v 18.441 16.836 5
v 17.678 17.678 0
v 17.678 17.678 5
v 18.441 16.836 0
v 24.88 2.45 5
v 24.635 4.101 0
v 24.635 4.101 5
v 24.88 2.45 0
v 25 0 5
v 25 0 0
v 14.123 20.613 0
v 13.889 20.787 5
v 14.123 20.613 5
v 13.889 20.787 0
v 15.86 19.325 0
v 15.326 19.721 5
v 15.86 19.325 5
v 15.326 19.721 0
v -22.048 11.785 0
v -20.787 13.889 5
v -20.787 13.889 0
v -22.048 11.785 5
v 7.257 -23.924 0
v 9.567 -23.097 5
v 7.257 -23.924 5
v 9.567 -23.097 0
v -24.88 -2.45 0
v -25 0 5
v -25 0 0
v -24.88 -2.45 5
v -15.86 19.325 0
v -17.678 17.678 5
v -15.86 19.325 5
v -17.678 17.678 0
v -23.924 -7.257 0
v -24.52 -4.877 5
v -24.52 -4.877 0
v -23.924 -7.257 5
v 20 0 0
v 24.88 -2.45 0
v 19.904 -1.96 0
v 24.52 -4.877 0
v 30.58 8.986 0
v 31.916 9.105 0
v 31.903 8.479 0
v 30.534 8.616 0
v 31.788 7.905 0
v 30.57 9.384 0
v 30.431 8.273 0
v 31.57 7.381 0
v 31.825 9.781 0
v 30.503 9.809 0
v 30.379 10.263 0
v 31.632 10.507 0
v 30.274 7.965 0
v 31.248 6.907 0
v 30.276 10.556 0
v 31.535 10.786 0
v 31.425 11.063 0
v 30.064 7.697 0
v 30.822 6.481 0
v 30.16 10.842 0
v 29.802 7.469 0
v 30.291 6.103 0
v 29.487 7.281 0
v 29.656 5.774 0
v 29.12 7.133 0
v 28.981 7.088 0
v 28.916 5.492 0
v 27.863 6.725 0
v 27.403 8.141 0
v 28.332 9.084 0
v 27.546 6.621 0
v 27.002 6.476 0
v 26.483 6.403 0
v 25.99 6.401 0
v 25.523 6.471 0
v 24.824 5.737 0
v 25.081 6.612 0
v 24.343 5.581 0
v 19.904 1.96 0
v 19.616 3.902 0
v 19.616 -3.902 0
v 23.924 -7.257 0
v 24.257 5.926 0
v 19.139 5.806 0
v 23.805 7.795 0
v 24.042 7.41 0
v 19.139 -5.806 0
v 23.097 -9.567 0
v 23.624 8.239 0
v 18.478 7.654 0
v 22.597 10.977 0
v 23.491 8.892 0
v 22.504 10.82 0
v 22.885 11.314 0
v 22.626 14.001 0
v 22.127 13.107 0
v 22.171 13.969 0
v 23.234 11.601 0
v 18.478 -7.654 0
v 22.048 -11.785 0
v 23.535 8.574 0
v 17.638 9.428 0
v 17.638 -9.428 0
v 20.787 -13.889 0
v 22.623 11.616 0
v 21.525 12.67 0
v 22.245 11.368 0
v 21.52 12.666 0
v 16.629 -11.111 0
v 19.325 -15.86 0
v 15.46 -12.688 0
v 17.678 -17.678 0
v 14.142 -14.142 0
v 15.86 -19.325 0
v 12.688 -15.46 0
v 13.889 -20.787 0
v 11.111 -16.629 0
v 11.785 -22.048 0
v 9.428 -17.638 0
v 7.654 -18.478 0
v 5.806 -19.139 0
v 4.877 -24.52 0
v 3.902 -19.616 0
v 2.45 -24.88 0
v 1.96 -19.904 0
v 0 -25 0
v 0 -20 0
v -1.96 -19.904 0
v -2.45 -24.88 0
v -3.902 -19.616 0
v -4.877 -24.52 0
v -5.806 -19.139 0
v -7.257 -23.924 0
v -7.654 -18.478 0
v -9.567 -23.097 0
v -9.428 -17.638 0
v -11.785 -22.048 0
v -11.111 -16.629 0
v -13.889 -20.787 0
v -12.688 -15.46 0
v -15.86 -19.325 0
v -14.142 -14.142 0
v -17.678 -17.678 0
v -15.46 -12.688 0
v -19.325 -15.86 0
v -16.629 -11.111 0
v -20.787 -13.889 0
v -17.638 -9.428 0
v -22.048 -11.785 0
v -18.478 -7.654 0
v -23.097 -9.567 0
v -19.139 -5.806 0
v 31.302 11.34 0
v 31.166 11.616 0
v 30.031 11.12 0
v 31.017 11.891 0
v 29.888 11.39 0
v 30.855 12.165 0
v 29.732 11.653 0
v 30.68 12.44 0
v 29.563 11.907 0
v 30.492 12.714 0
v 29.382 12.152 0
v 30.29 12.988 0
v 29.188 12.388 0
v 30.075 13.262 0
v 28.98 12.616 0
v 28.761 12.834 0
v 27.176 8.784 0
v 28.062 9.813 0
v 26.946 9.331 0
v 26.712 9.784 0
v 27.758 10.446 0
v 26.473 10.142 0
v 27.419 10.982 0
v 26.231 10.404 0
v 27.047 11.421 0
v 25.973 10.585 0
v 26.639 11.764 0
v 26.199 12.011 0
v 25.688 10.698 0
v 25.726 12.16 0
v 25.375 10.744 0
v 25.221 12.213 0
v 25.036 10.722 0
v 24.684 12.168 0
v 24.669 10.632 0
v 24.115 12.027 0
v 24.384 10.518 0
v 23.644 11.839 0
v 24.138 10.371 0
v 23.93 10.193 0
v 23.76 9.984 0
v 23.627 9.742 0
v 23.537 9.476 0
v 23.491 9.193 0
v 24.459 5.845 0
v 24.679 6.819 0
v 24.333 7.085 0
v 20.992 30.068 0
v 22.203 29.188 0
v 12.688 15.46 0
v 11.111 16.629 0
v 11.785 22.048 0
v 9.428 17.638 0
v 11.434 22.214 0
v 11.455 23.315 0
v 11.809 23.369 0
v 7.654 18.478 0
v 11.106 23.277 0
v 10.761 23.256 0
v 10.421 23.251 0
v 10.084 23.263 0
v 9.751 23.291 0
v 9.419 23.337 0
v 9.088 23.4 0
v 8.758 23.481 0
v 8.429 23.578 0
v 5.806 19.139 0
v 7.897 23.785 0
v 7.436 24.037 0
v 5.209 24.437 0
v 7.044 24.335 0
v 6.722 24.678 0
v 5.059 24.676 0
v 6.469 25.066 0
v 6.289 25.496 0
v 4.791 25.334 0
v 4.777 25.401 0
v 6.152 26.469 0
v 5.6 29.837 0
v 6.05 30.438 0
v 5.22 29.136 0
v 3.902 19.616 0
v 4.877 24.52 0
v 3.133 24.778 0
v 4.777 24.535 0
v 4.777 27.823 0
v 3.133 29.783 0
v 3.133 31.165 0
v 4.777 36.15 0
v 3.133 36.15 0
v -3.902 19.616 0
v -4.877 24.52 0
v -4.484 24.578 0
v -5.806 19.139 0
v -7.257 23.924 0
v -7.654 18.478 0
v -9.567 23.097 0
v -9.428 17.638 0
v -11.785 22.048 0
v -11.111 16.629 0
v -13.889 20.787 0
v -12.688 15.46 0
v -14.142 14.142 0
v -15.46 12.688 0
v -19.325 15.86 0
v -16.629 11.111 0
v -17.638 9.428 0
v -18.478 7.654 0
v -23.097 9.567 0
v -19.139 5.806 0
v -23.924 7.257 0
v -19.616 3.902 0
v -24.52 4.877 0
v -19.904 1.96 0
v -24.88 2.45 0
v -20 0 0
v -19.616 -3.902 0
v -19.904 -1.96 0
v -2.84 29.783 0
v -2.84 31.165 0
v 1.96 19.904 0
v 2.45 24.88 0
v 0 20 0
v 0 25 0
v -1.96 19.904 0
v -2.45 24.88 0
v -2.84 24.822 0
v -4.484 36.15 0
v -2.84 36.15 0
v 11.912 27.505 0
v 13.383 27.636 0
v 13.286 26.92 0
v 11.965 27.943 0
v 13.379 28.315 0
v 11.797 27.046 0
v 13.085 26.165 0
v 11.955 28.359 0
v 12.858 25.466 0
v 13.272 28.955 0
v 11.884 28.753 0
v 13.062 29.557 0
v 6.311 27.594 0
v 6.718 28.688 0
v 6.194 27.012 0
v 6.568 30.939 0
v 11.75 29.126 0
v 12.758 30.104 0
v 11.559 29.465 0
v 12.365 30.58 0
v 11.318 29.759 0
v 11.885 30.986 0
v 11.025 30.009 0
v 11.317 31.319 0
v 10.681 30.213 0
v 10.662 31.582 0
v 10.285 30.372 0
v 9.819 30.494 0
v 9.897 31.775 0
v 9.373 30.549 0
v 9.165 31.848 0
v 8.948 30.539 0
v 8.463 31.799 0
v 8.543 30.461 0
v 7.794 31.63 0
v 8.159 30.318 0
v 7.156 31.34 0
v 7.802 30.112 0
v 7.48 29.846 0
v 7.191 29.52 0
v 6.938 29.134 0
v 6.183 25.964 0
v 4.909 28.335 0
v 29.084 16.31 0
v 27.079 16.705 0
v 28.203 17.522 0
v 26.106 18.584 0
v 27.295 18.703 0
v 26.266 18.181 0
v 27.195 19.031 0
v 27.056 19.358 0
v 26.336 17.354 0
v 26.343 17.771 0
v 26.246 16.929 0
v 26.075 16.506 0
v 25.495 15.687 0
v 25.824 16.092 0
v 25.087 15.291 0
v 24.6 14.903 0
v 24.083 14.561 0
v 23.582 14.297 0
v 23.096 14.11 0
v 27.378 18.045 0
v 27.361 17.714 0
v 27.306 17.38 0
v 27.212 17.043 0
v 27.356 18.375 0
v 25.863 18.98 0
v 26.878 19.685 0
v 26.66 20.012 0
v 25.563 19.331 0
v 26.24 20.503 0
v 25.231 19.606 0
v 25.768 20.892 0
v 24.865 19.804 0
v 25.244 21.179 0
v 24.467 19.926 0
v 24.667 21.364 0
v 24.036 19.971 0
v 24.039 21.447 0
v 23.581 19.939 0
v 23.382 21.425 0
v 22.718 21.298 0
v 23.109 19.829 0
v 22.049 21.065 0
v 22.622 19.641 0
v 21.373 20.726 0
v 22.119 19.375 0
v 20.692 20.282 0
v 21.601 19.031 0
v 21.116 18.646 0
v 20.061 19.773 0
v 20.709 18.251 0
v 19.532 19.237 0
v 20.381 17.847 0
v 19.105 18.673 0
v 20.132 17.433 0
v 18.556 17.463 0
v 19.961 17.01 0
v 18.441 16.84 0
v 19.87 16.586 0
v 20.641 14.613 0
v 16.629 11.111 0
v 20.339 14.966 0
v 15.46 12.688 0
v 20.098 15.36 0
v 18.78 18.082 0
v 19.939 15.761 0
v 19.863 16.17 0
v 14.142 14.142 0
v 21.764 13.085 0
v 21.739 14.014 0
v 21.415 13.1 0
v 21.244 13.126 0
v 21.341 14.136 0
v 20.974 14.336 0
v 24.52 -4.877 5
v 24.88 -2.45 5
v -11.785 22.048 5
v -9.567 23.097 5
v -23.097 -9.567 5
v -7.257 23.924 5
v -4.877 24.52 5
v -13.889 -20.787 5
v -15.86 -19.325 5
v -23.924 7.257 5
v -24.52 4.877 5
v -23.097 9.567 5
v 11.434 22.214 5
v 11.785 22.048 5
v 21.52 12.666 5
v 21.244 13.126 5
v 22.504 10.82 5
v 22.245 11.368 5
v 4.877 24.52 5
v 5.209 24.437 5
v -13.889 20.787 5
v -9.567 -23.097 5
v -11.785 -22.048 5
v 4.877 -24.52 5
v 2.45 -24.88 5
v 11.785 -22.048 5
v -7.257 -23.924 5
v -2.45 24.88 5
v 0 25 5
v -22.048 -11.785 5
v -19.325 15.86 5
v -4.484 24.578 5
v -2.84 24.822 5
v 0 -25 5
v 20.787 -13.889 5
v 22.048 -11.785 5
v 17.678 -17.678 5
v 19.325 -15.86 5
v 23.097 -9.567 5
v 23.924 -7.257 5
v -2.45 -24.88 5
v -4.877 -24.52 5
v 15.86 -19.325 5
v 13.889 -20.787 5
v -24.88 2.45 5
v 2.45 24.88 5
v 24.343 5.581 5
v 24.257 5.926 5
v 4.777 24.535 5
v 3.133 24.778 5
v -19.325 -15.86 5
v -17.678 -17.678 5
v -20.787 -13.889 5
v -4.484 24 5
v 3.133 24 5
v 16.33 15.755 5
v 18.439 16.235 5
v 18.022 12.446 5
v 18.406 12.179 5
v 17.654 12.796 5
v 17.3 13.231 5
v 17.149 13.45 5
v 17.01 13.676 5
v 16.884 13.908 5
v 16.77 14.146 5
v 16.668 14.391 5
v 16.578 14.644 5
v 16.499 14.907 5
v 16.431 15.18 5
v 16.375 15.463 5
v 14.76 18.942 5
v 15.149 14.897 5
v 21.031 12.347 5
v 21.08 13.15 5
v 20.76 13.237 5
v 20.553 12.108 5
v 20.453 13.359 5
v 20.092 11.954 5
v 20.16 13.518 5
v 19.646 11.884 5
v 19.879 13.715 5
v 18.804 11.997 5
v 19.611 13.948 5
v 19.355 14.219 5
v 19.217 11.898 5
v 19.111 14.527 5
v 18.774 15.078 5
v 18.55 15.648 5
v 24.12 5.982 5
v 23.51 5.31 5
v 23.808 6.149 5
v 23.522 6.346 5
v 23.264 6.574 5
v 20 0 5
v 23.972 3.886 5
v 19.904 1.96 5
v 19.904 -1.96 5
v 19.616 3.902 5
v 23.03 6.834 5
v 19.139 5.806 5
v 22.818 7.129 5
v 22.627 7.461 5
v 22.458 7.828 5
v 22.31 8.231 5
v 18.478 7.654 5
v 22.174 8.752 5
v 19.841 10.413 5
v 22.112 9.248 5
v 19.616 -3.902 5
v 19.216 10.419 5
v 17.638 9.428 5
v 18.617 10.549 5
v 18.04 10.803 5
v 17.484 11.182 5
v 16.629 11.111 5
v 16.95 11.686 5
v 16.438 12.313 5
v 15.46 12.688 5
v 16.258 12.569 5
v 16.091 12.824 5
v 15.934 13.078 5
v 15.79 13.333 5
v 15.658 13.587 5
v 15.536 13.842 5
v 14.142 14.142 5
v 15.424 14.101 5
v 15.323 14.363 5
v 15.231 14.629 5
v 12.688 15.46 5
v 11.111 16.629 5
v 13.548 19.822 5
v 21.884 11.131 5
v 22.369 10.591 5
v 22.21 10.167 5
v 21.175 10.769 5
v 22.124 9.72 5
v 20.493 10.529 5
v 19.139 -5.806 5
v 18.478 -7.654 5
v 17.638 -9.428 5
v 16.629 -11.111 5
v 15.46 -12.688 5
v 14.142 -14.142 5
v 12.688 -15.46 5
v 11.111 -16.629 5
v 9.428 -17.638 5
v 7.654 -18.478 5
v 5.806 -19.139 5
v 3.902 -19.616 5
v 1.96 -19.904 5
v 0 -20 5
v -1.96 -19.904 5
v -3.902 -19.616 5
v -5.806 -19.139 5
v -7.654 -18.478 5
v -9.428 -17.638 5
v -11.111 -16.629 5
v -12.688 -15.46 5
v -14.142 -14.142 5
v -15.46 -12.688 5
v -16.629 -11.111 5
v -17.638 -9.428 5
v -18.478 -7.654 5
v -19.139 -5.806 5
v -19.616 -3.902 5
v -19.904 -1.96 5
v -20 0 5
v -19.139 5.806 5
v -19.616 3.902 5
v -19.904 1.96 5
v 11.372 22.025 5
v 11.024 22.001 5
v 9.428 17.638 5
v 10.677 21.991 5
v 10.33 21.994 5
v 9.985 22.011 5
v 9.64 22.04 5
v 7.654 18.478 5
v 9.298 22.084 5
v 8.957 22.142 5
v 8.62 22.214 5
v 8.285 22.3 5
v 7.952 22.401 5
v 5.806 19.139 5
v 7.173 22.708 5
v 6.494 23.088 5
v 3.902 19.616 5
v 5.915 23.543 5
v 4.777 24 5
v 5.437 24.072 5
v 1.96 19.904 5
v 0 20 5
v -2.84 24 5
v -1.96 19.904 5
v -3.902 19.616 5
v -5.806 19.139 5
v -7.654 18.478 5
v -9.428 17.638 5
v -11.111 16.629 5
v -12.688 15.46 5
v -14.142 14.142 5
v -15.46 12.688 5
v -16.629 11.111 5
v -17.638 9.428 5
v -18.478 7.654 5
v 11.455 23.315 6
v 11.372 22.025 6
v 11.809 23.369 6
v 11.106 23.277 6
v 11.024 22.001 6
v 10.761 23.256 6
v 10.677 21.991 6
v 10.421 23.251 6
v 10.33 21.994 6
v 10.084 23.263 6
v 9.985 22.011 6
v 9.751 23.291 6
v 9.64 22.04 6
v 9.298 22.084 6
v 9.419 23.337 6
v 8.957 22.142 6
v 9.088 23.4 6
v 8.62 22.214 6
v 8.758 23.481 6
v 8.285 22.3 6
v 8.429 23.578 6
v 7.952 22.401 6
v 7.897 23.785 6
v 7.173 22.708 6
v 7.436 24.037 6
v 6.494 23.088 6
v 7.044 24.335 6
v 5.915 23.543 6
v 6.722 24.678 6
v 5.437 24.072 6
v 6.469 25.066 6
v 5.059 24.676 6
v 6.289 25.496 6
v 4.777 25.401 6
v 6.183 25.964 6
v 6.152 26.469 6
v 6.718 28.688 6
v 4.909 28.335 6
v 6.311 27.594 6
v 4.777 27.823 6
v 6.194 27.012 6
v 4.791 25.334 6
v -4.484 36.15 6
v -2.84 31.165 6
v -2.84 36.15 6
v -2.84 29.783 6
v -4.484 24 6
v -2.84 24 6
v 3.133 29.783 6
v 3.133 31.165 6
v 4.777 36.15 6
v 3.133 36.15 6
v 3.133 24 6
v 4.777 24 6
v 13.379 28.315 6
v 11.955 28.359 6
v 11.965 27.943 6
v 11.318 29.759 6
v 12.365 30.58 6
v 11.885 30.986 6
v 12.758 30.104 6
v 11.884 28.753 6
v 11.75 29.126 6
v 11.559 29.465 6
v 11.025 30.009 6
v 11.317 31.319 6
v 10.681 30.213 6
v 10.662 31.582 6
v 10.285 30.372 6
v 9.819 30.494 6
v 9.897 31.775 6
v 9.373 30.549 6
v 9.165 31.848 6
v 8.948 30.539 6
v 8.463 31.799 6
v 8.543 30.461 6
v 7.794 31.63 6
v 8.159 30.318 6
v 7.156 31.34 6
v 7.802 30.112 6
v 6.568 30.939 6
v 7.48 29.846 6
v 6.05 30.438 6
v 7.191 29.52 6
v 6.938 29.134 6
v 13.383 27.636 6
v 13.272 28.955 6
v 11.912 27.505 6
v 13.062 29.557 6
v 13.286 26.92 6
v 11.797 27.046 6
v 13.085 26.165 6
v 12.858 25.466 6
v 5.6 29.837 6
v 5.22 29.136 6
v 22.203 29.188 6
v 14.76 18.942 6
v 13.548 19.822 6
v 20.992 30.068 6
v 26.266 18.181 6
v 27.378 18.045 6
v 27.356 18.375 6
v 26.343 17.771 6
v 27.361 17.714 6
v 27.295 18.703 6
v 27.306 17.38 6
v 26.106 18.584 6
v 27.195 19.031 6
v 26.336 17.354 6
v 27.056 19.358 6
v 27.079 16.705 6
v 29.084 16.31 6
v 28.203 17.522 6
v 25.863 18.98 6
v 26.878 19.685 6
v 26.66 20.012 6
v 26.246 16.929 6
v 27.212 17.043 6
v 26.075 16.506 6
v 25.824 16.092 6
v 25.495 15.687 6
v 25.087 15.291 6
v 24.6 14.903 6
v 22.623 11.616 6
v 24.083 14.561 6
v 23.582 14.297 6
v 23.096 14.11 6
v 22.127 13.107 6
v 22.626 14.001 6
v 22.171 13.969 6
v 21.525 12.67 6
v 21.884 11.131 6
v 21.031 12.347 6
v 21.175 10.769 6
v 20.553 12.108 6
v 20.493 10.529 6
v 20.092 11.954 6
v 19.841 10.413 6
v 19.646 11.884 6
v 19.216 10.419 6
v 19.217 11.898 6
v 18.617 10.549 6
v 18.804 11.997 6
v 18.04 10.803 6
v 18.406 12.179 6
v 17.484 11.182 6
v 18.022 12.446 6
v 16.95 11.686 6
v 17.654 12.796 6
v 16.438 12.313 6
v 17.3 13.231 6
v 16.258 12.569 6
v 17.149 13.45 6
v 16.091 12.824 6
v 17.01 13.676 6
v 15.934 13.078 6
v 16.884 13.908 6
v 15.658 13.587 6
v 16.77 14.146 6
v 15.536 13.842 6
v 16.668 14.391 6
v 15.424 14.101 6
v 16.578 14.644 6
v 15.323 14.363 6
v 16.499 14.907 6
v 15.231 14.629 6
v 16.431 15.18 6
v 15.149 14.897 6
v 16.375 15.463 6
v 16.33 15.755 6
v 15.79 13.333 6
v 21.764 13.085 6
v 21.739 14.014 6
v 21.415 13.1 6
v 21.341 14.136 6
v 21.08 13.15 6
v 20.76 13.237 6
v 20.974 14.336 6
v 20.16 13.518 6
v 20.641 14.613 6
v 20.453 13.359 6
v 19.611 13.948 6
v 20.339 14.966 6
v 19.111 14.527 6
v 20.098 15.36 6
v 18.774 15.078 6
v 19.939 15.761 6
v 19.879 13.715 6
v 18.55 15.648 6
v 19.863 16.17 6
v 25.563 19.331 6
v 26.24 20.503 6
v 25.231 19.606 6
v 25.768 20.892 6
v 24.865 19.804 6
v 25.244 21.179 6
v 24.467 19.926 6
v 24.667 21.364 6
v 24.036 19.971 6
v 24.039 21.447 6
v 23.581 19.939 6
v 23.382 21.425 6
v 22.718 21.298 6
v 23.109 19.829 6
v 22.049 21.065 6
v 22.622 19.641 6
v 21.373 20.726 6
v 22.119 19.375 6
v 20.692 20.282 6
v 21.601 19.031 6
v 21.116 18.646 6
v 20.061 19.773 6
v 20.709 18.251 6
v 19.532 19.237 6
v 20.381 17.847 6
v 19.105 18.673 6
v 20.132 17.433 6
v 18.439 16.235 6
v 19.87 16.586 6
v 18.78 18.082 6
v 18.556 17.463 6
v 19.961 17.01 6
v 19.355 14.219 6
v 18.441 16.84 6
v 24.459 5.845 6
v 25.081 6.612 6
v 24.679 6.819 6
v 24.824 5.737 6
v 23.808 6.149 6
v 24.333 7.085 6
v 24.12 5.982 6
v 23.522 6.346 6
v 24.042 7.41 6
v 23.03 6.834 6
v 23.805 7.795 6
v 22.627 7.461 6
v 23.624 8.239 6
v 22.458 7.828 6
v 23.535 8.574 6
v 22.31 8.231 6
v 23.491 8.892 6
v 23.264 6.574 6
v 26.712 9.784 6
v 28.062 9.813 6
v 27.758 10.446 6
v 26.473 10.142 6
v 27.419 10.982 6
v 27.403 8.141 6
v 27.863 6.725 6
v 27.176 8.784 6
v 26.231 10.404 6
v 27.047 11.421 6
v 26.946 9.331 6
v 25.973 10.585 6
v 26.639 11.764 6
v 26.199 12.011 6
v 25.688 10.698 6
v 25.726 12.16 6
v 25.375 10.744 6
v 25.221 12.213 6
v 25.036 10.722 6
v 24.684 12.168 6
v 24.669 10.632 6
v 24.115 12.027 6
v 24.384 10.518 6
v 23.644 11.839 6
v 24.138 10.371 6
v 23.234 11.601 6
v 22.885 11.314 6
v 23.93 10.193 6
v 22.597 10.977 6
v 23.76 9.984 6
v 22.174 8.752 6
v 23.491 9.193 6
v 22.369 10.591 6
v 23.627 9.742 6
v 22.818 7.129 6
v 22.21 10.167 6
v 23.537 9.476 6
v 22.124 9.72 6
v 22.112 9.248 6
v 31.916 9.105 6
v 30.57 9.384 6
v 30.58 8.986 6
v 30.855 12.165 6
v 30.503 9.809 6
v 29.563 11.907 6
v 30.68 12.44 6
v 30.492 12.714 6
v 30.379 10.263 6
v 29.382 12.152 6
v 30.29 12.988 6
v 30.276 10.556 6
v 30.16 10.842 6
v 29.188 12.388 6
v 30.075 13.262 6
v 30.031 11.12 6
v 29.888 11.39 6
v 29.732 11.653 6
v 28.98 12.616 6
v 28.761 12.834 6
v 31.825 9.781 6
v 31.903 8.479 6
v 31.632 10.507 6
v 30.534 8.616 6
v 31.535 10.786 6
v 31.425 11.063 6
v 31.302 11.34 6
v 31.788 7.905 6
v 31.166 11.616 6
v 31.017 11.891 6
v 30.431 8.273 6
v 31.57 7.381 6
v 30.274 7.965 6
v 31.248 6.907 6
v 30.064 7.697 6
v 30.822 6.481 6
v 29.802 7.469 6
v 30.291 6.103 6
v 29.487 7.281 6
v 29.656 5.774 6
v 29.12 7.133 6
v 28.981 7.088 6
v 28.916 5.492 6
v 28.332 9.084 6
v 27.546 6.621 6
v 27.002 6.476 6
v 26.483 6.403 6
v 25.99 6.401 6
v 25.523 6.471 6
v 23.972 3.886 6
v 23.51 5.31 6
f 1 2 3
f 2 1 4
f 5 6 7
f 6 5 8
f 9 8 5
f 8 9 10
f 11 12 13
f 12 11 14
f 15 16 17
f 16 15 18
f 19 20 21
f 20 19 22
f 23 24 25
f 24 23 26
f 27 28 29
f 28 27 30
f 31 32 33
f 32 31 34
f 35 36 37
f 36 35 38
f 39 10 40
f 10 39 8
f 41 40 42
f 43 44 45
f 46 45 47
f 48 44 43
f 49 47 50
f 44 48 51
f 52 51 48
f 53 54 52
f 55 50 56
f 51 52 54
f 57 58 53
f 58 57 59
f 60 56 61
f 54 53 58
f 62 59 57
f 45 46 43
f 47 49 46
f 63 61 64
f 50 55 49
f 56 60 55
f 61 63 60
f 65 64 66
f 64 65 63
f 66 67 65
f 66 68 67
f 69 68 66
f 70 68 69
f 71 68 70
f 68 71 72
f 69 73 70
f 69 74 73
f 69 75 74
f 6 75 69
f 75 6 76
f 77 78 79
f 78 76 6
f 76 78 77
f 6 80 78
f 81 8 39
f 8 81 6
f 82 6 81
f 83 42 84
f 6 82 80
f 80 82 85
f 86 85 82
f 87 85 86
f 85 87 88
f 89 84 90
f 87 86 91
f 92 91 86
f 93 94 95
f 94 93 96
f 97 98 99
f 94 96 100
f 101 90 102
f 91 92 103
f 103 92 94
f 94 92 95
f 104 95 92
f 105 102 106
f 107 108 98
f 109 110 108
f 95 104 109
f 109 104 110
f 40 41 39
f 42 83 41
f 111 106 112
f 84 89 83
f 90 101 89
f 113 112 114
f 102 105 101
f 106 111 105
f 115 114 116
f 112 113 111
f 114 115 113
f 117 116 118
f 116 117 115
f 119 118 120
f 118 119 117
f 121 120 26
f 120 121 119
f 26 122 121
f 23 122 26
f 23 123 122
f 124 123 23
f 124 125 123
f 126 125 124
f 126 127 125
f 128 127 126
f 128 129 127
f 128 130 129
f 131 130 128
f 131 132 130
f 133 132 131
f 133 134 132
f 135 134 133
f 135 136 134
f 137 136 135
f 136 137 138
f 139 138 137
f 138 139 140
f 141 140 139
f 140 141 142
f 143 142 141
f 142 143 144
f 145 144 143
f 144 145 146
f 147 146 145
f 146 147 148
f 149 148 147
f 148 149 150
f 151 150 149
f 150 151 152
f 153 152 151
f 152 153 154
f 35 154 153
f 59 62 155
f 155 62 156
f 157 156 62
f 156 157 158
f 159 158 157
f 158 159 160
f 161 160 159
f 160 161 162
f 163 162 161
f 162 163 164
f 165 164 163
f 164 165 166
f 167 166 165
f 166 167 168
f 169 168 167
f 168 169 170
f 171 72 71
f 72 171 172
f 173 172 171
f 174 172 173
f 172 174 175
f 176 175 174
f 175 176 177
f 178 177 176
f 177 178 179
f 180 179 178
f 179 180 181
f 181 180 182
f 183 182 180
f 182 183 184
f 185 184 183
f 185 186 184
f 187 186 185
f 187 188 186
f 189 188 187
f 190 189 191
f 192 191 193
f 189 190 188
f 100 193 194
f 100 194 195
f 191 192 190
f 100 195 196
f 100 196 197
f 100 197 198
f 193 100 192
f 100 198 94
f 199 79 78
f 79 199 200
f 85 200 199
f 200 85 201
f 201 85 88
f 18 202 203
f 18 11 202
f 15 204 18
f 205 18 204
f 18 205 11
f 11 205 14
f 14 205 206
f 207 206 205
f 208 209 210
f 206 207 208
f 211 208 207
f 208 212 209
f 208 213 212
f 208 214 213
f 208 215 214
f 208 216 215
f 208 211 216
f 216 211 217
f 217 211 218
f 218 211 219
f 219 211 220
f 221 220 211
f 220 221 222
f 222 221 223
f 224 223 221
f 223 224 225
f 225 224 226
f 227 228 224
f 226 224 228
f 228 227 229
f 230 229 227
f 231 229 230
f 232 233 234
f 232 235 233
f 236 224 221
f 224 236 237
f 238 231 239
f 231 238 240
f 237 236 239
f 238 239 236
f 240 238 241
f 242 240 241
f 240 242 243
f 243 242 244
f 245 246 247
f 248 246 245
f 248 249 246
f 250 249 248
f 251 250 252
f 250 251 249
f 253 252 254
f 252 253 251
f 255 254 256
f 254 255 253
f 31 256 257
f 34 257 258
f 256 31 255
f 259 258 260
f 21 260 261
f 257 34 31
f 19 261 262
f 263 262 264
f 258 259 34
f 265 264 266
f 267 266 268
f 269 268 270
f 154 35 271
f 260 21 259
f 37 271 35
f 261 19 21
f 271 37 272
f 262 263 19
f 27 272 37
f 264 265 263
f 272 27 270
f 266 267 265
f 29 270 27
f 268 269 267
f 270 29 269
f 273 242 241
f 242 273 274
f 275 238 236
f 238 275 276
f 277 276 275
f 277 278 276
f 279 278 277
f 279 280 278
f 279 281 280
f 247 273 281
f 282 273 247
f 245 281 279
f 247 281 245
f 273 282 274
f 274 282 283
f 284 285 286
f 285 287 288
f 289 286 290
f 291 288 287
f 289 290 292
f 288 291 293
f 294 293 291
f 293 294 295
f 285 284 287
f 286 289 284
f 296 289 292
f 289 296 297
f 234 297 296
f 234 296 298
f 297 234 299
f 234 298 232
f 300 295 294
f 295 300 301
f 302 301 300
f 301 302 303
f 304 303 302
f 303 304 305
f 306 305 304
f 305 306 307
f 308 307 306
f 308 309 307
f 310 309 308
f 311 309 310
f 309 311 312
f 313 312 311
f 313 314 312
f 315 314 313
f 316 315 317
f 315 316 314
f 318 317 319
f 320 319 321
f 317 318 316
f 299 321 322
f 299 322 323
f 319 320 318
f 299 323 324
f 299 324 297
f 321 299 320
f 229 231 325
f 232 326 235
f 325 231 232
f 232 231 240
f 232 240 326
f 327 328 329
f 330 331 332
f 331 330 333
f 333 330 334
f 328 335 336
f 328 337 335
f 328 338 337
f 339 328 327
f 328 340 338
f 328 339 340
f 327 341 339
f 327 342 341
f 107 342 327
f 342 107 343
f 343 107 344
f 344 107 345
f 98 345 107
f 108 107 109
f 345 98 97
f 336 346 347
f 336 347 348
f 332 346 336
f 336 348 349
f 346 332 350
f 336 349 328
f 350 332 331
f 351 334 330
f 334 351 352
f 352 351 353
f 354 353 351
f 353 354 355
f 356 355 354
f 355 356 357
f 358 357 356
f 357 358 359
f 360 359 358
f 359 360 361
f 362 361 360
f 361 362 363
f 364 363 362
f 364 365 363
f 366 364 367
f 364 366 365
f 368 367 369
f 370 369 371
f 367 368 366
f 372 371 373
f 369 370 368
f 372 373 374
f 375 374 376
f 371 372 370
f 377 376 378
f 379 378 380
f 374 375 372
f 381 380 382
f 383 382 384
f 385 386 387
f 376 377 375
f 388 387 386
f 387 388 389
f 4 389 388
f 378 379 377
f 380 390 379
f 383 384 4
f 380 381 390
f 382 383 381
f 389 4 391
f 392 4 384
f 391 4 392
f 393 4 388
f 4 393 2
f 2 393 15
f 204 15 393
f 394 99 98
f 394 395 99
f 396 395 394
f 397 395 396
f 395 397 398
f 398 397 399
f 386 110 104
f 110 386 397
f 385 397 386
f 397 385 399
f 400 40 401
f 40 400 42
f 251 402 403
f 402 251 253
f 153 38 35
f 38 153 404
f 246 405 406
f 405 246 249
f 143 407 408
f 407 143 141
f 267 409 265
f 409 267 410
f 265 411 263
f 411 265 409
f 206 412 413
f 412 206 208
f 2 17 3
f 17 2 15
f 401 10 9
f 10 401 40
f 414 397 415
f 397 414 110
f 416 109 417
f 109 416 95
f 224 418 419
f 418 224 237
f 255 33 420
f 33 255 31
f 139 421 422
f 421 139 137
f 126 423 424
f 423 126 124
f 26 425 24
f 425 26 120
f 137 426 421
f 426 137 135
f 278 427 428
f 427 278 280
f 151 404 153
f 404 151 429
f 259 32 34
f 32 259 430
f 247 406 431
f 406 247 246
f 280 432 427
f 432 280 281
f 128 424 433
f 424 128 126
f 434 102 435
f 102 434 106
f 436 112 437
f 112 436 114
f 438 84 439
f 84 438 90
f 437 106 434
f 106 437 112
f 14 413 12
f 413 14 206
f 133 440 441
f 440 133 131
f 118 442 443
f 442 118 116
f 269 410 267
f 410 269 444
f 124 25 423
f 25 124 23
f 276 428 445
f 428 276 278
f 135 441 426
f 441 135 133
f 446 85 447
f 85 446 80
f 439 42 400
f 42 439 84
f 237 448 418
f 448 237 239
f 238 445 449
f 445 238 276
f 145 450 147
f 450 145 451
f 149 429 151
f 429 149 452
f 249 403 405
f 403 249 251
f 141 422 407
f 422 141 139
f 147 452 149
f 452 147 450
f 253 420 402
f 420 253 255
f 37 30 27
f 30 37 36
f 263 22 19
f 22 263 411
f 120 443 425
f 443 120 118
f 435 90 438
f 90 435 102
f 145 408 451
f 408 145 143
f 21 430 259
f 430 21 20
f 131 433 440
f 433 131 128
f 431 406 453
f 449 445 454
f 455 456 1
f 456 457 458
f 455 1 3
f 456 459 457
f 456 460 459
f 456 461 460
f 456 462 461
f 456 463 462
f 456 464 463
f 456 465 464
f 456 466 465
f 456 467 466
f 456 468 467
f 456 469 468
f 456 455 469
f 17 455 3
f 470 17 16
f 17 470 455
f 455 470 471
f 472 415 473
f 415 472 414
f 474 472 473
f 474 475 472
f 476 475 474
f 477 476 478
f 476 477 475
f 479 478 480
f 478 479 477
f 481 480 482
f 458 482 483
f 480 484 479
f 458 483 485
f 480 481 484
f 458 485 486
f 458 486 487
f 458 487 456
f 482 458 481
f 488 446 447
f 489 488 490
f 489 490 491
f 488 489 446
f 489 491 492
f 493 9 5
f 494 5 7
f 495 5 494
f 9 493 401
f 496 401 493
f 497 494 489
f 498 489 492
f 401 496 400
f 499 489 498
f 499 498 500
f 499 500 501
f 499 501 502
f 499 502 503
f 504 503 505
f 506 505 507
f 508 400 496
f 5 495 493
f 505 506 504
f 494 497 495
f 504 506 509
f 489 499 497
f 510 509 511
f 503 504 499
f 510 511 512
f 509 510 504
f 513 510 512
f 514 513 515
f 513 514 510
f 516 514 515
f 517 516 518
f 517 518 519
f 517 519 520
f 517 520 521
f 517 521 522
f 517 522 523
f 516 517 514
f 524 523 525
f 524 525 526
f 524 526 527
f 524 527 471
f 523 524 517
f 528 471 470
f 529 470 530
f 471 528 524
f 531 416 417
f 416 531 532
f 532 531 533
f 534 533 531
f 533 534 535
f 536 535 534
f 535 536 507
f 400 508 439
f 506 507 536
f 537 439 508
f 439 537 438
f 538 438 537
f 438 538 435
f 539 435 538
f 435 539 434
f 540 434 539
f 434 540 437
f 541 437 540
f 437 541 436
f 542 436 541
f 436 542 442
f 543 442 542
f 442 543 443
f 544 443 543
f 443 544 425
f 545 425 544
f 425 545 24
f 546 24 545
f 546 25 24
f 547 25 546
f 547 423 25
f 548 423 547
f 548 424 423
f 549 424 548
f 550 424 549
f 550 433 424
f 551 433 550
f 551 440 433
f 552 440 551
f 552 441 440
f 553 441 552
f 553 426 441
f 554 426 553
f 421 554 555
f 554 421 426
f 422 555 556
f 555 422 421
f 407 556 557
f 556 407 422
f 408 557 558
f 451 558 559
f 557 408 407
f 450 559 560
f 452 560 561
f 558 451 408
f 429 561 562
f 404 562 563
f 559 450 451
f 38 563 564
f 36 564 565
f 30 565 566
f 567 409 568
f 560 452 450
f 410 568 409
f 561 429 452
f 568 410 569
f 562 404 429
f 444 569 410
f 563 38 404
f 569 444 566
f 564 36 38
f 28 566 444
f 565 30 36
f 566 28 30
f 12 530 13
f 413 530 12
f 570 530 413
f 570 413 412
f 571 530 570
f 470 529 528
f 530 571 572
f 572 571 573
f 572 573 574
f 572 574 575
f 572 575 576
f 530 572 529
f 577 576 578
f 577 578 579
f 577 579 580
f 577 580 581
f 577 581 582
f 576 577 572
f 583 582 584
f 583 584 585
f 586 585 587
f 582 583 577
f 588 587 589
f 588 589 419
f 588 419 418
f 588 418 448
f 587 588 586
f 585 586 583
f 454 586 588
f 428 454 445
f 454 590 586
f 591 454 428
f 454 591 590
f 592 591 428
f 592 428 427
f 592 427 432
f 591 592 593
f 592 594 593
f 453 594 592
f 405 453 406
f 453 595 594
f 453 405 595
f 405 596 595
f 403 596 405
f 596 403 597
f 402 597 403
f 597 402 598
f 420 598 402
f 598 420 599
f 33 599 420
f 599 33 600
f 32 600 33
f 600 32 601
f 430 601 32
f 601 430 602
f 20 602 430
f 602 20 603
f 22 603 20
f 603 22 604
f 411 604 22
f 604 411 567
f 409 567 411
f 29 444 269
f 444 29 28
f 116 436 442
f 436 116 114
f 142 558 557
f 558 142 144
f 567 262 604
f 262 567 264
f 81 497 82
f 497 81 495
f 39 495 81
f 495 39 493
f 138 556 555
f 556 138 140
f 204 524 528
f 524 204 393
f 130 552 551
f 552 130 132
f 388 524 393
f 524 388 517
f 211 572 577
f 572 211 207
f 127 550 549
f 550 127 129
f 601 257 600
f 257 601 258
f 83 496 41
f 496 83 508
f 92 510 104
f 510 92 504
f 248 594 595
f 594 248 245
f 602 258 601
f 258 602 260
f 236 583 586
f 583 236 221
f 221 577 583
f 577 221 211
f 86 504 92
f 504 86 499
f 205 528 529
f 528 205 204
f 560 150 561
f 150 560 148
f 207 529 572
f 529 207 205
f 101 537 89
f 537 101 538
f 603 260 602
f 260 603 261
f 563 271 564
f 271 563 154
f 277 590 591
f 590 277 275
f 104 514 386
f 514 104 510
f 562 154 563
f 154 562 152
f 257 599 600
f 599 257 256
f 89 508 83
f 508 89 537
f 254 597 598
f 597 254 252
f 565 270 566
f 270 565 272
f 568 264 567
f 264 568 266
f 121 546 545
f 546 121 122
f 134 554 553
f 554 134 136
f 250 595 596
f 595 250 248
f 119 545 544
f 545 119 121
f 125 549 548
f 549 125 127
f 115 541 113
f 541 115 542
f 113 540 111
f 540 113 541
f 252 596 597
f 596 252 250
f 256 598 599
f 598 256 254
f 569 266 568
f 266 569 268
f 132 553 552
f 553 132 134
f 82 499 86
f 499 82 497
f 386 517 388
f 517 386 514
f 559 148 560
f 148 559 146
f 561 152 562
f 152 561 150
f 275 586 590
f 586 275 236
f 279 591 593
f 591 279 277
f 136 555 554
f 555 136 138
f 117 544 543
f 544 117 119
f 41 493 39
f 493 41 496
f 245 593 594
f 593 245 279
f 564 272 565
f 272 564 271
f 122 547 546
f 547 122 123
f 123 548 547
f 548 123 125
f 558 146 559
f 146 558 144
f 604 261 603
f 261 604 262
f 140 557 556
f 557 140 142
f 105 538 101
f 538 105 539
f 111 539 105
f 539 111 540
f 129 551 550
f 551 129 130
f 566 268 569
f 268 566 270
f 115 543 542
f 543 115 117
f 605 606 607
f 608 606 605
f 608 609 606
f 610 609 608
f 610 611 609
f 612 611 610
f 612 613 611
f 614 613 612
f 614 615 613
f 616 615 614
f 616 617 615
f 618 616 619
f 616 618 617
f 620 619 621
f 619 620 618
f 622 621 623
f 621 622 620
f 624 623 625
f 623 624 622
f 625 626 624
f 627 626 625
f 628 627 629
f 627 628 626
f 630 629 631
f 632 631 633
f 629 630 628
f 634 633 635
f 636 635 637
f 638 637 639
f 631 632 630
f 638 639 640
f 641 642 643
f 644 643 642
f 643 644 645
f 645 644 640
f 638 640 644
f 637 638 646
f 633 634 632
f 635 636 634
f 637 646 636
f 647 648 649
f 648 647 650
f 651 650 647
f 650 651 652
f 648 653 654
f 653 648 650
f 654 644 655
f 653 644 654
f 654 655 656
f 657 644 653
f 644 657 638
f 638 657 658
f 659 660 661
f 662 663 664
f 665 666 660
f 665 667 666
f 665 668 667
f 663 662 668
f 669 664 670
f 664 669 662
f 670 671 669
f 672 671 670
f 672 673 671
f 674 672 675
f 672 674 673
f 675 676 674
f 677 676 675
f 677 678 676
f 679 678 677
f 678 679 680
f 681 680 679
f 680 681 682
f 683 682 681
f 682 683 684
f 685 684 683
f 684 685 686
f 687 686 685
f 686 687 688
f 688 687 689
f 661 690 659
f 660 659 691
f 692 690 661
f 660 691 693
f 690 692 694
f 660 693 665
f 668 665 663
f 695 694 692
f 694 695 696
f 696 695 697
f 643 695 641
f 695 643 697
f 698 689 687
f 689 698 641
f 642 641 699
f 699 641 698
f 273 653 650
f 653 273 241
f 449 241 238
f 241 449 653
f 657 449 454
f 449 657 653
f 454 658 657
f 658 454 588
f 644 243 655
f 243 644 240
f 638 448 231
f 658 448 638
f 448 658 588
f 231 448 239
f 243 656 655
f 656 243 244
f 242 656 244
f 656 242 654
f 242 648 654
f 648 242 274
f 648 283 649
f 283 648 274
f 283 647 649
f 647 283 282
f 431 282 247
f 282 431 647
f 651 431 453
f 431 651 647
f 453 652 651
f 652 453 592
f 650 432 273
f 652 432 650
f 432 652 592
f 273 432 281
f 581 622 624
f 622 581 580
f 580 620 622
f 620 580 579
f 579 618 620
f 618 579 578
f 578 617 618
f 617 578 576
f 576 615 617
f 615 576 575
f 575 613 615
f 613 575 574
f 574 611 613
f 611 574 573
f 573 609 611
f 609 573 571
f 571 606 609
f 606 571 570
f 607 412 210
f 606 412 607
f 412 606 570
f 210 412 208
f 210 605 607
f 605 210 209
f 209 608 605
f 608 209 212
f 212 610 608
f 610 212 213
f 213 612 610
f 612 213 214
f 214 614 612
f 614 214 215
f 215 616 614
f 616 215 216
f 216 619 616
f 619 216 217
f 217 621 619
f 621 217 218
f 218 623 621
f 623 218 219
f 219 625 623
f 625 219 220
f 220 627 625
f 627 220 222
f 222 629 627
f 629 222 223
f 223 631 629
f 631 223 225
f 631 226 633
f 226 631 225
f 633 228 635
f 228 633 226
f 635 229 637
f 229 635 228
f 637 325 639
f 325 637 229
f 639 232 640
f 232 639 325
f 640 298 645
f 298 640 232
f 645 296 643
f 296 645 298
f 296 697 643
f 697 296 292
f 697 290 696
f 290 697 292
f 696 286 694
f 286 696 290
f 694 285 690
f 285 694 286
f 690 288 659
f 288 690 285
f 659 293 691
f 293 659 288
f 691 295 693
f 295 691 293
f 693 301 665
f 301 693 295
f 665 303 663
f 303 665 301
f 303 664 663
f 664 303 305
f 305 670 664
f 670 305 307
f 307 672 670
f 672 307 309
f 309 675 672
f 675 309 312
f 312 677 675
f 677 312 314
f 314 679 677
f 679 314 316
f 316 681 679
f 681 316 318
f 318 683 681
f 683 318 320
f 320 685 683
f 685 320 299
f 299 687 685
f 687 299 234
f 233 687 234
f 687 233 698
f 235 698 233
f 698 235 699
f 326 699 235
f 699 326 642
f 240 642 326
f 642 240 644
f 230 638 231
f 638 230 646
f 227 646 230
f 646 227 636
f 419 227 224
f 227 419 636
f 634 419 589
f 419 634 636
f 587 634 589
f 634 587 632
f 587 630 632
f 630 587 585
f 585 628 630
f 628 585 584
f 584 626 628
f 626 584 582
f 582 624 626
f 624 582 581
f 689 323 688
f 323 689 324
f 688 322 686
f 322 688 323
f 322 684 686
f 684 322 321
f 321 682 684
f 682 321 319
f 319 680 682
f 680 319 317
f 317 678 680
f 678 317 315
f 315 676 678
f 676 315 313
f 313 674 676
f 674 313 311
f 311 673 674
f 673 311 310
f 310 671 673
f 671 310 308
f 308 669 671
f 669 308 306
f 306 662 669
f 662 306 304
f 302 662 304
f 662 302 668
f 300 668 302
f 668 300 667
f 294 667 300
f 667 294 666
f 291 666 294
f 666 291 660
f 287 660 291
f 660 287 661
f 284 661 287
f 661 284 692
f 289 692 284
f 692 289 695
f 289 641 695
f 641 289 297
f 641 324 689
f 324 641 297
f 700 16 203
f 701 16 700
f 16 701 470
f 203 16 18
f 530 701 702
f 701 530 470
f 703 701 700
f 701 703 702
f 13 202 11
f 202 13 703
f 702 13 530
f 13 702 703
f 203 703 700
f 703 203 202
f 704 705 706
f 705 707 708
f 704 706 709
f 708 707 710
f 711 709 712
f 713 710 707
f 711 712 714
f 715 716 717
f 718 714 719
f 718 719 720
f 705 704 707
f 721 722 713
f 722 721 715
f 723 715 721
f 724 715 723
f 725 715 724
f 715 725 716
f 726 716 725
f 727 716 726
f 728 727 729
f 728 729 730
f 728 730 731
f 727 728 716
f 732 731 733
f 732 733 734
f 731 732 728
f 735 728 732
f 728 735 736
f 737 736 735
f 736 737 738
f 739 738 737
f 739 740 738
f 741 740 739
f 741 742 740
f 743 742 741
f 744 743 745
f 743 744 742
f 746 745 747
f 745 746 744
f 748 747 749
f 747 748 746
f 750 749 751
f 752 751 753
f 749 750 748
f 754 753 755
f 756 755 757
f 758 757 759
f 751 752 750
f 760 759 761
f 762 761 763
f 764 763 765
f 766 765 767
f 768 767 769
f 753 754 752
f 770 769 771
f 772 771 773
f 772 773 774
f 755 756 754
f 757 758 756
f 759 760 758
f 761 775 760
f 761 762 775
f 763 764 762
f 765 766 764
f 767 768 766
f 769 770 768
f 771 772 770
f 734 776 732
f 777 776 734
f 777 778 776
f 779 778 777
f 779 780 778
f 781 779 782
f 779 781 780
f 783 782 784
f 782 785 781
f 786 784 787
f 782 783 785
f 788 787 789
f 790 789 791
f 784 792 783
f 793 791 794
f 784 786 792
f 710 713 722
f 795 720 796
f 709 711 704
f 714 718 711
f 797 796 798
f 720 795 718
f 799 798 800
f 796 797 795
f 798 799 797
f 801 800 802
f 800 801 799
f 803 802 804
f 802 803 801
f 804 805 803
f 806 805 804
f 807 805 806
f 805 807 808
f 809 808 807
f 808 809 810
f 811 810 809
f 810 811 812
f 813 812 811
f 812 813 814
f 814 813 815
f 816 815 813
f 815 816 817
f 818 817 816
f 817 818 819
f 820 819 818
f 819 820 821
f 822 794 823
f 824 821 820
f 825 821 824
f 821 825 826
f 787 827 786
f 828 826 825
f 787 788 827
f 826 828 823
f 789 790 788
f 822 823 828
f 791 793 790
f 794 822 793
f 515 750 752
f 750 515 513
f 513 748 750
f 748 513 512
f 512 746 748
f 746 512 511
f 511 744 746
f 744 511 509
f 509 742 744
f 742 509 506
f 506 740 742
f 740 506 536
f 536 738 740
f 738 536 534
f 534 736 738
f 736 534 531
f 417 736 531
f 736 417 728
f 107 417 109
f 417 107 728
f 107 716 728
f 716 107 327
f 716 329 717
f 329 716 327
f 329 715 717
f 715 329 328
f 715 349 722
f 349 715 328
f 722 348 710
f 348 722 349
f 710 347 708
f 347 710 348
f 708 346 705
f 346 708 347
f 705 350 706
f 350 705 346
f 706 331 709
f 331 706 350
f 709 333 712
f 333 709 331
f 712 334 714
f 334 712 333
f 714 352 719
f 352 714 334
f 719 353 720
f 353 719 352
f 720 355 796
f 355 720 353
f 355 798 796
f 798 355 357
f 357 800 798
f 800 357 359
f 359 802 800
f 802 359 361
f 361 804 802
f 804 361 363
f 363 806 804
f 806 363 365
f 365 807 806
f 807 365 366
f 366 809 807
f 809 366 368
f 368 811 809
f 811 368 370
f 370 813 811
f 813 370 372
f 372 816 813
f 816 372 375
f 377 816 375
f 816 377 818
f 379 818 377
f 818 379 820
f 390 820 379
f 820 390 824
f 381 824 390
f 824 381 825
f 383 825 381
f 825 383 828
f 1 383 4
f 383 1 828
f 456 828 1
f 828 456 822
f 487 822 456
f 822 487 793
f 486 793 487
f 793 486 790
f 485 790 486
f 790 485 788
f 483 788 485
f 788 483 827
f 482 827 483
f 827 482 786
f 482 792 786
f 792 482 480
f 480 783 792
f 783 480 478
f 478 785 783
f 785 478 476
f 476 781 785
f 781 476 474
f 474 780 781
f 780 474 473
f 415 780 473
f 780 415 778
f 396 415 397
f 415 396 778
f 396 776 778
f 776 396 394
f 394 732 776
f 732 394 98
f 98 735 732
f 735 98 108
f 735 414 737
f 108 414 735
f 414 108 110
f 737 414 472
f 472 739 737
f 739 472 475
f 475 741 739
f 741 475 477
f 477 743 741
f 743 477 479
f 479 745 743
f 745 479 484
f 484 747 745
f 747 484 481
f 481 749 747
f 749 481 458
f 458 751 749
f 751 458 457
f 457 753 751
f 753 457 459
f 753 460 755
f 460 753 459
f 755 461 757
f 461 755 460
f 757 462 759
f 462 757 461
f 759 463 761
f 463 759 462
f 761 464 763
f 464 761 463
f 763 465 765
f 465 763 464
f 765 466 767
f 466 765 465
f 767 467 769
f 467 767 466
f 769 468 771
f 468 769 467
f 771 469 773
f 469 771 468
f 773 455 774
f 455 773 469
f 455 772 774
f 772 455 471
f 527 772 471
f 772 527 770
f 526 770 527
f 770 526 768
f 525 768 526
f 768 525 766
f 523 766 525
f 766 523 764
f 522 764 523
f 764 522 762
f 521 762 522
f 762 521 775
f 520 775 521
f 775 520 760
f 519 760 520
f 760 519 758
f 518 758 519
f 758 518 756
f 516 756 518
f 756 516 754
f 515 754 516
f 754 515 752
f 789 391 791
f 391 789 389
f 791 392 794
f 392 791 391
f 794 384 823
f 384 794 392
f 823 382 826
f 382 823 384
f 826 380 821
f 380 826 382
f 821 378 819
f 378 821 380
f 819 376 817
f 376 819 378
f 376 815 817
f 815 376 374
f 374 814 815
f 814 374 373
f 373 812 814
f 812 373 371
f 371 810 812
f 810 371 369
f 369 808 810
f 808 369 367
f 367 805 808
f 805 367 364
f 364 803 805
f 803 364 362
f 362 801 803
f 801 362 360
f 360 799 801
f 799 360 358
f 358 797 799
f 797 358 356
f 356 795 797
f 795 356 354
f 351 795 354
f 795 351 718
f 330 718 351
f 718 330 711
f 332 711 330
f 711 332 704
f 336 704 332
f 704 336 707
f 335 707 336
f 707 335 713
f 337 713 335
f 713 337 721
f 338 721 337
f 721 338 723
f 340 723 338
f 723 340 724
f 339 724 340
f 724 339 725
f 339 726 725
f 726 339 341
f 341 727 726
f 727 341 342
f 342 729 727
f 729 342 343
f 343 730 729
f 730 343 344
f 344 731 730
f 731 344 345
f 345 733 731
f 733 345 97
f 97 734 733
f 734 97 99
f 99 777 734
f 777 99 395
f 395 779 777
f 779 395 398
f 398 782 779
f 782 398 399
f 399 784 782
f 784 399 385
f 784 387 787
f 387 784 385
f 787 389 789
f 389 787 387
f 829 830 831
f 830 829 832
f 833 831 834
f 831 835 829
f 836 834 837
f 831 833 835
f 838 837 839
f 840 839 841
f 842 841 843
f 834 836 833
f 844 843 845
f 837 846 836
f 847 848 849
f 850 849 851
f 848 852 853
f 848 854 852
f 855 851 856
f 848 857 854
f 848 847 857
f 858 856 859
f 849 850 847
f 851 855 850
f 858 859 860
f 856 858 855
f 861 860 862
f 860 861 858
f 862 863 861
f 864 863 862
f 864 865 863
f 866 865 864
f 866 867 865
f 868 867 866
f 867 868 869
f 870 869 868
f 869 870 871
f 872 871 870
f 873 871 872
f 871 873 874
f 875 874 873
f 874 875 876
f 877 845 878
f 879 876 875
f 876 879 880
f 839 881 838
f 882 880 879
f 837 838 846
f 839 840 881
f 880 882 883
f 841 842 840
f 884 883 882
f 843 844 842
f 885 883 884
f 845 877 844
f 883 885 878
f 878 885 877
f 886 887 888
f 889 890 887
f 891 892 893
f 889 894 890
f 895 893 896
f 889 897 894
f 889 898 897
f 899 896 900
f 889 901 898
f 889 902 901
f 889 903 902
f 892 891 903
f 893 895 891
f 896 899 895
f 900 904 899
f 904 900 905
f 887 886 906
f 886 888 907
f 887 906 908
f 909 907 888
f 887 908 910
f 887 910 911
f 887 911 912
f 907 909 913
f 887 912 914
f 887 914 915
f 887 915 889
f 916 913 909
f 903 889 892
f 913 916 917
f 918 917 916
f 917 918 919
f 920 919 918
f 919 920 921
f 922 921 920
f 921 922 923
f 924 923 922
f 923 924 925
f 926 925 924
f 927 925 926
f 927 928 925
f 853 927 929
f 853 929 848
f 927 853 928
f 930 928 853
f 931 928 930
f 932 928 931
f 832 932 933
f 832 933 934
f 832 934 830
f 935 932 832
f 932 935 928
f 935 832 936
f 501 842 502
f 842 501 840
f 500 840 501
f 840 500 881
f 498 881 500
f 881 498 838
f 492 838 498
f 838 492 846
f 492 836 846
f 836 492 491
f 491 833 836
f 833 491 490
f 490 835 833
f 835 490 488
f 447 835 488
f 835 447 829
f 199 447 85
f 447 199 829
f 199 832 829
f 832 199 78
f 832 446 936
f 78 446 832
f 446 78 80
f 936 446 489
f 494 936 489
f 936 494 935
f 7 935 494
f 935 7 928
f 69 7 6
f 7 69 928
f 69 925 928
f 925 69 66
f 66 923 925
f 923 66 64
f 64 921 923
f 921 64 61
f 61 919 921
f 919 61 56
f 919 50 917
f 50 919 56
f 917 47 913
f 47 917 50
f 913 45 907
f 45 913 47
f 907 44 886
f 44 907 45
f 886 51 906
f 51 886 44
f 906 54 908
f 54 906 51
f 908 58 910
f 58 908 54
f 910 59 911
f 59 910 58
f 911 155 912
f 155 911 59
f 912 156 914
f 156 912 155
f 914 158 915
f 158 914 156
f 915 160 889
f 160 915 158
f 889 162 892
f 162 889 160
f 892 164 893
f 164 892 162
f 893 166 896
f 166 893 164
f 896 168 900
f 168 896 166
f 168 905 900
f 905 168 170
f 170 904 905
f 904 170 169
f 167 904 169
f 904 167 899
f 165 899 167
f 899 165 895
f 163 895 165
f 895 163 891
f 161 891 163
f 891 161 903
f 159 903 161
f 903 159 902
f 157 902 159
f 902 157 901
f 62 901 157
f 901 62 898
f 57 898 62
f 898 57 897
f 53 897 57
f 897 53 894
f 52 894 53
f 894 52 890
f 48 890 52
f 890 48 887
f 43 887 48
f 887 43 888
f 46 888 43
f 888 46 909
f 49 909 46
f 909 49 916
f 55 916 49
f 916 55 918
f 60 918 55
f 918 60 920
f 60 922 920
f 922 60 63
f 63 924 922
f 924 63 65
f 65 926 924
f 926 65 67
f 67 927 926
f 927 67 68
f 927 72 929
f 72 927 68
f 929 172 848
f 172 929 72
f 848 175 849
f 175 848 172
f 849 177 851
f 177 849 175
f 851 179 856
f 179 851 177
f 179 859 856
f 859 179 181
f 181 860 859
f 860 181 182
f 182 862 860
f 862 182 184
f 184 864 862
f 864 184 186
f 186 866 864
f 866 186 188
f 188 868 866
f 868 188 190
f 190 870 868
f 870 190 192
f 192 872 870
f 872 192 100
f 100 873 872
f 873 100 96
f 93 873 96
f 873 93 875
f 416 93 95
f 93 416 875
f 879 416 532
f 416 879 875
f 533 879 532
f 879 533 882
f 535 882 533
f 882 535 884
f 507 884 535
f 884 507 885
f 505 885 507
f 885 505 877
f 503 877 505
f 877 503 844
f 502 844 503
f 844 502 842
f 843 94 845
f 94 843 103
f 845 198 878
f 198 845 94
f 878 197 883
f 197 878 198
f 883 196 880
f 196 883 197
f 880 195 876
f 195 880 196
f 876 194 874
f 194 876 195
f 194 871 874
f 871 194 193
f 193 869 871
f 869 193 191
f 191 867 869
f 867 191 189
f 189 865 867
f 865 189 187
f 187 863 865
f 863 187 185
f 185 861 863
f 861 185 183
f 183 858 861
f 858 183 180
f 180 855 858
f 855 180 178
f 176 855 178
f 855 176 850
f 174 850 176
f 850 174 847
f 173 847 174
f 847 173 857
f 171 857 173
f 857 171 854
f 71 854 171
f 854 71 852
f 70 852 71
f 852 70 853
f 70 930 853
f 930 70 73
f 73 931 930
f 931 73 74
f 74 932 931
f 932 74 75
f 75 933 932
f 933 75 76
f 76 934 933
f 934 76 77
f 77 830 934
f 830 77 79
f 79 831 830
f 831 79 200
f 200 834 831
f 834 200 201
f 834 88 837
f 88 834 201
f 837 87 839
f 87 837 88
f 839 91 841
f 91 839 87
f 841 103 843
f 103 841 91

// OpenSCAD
//CUSTOMIZER VARIABLES
prefixcheat = $preview ? 0.1 : 0;

// Name or Text
Text = "Helga";

// Adjust spacing between letters
Degrees = 18; //  [13,14,15,16,17]

//Font = "Trattatello";
//Font = "Trattatello:style=Bold";
//Font = "Apple Chancery:style=筆寫斜體";
Font = "Herculanum:style=Regular";

// Set Torus = true if you want the ring to be a torus, without the
// sharp edges.
Torus = 0;
Torus_r = 3;

//CUSTOMIZER VARIABLES END

module L_0(char = "A", Degrees = 15, i = 0) {
    rotate([0,0,-Degrees*i])
    translate([0,24,0])
    linear_extrude(height = 6)
//    text(size = 12, text = char, font = "Chewy:style=bold", halign = "center", valign= "bottom", $fn = 32);
    text(size = 12, text = char, font = Font, halign = "center", $fn = 32);
}

union() {
    if (Torus) {
        translate([0,0,Torus_r/2]) {
            rotate_extrude(angle=360, convexity = 2) {
                translate([25, 0])
                    circle(r=Torus_r);
            }
        }
    } else {
        difference() {
            cylinder(h = 5, r = 25, $fn = 64);
            translate([0,0,-prefixcheat])
                cylinder(h = 5+prefixcheat*2, r = 20, $fn = 64);
        }
    }
    
    union() {
        for (i = [0:len(Text)-1]) {
            L_0(Text[i], Degrees, i);
        }
    }
}
